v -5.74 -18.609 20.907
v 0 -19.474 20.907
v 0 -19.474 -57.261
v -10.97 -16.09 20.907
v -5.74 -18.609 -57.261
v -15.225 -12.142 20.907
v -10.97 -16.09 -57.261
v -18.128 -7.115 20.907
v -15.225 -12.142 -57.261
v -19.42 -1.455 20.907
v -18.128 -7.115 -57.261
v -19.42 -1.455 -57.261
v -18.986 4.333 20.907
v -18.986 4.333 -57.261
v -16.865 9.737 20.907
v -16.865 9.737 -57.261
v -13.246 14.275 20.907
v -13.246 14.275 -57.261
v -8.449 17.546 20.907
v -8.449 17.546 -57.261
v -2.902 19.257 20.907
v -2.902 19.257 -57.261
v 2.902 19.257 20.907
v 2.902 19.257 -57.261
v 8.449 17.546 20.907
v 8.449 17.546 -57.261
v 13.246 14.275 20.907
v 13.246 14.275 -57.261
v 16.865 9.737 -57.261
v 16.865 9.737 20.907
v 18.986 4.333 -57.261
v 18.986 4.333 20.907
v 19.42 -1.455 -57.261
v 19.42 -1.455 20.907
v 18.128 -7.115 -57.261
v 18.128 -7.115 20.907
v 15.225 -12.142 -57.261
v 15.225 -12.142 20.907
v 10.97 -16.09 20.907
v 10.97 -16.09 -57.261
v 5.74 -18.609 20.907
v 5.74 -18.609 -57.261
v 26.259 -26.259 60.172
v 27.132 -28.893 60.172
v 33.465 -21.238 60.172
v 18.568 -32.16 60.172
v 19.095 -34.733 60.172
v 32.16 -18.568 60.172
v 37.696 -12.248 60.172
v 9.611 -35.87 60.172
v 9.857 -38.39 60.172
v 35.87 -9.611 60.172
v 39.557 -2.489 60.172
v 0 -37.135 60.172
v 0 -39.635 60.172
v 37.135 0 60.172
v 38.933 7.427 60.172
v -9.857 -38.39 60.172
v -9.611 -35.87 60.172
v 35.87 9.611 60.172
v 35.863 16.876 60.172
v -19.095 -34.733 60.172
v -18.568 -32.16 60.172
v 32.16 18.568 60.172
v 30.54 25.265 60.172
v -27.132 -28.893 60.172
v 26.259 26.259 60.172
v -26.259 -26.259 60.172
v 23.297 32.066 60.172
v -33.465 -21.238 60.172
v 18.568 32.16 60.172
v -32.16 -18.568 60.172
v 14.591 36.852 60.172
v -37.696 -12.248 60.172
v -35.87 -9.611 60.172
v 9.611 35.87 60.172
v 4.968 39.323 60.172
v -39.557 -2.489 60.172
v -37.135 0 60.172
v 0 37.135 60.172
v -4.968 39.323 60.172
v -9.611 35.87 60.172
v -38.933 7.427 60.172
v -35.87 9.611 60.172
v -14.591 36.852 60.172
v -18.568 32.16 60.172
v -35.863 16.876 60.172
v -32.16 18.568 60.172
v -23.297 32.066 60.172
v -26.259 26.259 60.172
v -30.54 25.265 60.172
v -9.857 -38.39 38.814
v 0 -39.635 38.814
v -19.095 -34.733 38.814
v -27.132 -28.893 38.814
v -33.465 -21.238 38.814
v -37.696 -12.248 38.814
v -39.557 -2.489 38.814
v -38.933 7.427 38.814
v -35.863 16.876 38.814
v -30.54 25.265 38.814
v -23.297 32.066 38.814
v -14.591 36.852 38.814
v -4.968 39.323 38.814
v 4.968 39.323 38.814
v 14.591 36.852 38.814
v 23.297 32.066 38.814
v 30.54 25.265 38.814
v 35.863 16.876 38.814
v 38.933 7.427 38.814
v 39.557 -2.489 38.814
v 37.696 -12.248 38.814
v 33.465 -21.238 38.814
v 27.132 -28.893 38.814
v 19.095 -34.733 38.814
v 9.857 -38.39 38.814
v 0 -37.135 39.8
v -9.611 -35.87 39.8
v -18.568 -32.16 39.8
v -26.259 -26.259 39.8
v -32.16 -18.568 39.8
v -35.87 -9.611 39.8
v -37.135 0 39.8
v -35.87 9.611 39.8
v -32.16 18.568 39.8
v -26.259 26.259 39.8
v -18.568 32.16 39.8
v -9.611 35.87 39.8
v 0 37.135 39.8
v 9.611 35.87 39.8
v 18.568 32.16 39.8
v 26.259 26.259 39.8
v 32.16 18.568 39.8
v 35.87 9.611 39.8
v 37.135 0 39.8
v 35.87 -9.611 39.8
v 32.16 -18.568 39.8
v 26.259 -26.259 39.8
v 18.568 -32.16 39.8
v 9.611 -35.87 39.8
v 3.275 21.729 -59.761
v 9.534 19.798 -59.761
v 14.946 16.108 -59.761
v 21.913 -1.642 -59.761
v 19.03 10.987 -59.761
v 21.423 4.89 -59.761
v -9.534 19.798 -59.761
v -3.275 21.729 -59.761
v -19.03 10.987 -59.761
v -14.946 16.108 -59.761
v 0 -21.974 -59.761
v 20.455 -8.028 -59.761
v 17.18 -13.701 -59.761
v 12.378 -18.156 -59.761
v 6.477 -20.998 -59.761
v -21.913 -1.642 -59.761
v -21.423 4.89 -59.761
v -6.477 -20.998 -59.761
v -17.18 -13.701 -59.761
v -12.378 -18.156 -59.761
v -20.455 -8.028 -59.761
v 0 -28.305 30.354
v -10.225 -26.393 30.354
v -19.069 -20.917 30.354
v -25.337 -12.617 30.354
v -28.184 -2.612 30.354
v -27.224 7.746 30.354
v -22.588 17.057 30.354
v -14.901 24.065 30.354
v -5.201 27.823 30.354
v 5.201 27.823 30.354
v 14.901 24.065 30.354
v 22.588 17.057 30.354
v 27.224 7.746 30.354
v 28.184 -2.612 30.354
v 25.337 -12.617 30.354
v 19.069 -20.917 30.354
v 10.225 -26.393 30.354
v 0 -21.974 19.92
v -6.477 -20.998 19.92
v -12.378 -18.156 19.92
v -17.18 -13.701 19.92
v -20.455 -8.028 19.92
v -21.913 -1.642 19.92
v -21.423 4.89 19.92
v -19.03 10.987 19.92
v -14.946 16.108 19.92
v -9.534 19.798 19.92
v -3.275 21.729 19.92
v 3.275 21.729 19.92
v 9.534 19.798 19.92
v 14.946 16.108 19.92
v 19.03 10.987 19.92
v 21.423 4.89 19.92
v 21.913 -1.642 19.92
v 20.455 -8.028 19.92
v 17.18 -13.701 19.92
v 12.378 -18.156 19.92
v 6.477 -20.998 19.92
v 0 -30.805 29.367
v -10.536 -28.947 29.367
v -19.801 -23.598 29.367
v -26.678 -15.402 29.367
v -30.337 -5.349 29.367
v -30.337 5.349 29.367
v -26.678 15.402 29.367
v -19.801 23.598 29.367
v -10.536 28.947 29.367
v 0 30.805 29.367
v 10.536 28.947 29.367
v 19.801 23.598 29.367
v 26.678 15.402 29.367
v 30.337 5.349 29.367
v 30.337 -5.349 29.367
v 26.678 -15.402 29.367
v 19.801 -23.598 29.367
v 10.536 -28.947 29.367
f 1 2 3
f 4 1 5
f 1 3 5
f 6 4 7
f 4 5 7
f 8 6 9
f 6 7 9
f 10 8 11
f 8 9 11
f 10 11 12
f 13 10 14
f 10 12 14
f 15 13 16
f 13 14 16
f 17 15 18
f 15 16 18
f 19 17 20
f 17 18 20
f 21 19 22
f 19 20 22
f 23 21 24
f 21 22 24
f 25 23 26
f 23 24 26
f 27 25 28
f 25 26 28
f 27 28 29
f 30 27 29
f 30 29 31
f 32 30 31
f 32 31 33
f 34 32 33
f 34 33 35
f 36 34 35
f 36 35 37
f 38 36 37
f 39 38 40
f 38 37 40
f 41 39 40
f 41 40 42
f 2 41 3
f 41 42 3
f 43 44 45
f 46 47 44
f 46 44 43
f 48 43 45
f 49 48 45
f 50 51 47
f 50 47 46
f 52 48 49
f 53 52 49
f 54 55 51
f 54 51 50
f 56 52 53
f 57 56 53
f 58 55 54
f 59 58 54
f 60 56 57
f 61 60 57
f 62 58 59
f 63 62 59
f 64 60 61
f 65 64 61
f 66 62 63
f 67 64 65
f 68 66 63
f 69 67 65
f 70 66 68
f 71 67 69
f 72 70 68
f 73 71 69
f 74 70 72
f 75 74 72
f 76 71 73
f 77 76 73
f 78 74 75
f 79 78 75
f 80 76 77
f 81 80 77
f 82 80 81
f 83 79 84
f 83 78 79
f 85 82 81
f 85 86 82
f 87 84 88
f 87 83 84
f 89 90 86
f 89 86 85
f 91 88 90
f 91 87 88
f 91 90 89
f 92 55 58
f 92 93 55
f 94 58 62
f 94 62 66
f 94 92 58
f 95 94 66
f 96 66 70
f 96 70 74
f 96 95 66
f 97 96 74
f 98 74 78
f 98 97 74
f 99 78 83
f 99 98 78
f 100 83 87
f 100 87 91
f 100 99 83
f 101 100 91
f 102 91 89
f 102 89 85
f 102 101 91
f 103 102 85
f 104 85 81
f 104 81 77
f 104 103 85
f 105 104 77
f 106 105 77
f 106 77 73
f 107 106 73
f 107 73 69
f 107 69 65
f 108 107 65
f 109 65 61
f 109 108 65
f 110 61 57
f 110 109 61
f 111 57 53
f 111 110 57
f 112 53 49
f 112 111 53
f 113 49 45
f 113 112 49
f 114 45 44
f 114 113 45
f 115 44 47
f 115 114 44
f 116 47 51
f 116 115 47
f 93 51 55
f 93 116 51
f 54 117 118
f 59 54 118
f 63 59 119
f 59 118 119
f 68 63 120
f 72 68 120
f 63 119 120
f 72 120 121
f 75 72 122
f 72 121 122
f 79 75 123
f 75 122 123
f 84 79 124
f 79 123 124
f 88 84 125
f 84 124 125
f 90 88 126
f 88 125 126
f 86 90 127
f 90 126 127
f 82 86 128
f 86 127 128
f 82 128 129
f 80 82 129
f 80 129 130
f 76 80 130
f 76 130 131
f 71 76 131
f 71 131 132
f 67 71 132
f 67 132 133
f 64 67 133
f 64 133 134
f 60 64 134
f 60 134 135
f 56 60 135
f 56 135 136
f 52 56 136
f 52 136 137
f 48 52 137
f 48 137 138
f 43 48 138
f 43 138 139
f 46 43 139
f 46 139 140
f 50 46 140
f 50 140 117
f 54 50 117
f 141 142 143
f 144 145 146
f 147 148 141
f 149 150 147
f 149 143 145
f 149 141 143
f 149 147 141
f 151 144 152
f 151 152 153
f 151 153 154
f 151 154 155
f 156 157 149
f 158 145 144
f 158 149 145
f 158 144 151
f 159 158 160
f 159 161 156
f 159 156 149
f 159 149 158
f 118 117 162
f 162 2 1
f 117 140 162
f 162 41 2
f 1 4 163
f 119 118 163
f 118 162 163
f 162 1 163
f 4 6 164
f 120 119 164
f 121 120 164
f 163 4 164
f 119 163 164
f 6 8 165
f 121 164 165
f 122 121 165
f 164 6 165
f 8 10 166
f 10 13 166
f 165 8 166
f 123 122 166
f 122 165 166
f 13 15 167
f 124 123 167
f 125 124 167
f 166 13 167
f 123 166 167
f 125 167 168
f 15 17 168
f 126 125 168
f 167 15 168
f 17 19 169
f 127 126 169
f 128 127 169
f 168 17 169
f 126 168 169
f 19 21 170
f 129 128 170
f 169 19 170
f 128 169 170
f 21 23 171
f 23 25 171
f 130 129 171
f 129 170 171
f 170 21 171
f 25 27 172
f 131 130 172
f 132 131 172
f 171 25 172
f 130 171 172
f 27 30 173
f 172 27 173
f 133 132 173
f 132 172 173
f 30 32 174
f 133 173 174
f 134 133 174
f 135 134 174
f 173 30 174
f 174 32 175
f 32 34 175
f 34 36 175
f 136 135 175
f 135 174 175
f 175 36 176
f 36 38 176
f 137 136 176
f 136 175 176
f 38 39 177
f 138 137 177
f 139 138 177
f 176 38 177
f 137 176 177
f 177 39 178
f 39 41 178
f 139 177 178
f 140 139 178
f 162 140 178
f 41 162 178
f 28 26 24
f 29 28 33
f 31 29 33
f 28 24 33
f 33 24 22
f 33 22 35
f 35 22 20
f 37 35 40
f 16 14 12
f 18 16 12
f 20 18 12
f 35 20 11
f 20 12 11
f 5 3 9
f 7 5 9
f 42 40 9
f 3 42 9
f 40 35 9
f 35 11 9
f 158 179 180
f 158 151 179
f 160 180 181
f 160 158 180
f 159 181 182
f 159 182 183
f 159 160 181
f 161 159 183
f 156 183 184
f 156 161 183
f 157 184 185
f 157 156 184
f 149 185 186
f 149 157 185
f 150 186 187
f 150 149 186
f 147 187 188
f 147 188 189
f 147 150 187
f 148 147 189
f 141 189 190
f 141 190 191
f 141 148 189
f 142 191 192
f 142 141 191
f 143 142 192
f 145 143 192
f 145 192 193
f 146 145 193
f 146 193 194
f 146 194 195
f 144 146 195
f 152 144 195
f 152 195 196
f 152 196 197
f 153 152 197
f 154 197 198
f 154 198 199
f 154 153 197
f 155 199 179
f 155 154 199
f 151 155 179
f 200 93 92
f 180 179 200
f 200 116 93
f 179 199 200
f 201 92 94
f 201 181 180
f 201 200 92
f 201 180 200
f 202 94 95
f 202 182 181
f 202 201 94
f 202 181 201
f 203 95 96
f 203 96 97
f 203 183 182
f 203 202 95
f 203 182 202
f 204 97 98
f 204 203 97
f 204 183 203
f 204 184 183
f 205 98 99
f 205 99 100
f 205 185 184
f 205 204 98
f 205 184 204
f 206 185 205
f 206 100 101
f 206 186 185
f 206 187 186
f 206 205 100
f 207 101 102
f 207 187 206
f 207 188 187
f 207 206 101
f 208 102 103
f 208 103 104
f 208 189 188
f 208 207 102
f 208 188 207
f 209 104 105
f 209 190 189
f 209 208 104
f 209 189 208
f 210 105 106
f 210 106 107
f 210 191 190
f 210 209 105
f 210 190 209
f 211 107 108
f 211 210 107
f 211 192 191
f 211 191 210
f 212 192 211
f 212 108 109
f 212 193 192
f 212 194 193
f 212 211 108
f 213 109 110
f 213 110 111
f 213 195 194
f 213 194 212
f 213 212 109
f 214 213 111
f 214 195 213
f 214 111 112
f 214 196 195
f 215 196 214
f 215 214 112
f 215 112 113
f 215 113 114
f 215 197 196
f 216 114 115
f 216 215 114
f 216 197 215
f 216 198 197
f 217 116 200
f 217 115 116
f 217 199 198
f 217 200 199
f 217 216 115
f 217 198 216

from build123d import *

# Parameters (mm, degrees)
F2_T = -2.5


with BuildPart() as f1:
    # F0 (on Right) → F1 (revolve)
    with BuildSketch(Plane.YZ):
        Polygon((-21.9740401953, -59.7611889243), (0, -59.7611889243), (0, 60.1719170809), (-39.6354235709, 60.1719170809), (-39.6354235709, 38.8139672577), (-21.9740401953, 19.9203956872), align=None)
    revolve(axis=Axis((0, 0, 0.2053640783), (0, 0, -1)))

    # F2
    f2_openings = [f1.faces().sort_by_distance(p)[0] for p in [
        (0, 0, 60.171917),
    ]]
    offset(amount=F2_T, openings=f2_openings, kind=Kind.INTERSECTION)


solid = f1.part
